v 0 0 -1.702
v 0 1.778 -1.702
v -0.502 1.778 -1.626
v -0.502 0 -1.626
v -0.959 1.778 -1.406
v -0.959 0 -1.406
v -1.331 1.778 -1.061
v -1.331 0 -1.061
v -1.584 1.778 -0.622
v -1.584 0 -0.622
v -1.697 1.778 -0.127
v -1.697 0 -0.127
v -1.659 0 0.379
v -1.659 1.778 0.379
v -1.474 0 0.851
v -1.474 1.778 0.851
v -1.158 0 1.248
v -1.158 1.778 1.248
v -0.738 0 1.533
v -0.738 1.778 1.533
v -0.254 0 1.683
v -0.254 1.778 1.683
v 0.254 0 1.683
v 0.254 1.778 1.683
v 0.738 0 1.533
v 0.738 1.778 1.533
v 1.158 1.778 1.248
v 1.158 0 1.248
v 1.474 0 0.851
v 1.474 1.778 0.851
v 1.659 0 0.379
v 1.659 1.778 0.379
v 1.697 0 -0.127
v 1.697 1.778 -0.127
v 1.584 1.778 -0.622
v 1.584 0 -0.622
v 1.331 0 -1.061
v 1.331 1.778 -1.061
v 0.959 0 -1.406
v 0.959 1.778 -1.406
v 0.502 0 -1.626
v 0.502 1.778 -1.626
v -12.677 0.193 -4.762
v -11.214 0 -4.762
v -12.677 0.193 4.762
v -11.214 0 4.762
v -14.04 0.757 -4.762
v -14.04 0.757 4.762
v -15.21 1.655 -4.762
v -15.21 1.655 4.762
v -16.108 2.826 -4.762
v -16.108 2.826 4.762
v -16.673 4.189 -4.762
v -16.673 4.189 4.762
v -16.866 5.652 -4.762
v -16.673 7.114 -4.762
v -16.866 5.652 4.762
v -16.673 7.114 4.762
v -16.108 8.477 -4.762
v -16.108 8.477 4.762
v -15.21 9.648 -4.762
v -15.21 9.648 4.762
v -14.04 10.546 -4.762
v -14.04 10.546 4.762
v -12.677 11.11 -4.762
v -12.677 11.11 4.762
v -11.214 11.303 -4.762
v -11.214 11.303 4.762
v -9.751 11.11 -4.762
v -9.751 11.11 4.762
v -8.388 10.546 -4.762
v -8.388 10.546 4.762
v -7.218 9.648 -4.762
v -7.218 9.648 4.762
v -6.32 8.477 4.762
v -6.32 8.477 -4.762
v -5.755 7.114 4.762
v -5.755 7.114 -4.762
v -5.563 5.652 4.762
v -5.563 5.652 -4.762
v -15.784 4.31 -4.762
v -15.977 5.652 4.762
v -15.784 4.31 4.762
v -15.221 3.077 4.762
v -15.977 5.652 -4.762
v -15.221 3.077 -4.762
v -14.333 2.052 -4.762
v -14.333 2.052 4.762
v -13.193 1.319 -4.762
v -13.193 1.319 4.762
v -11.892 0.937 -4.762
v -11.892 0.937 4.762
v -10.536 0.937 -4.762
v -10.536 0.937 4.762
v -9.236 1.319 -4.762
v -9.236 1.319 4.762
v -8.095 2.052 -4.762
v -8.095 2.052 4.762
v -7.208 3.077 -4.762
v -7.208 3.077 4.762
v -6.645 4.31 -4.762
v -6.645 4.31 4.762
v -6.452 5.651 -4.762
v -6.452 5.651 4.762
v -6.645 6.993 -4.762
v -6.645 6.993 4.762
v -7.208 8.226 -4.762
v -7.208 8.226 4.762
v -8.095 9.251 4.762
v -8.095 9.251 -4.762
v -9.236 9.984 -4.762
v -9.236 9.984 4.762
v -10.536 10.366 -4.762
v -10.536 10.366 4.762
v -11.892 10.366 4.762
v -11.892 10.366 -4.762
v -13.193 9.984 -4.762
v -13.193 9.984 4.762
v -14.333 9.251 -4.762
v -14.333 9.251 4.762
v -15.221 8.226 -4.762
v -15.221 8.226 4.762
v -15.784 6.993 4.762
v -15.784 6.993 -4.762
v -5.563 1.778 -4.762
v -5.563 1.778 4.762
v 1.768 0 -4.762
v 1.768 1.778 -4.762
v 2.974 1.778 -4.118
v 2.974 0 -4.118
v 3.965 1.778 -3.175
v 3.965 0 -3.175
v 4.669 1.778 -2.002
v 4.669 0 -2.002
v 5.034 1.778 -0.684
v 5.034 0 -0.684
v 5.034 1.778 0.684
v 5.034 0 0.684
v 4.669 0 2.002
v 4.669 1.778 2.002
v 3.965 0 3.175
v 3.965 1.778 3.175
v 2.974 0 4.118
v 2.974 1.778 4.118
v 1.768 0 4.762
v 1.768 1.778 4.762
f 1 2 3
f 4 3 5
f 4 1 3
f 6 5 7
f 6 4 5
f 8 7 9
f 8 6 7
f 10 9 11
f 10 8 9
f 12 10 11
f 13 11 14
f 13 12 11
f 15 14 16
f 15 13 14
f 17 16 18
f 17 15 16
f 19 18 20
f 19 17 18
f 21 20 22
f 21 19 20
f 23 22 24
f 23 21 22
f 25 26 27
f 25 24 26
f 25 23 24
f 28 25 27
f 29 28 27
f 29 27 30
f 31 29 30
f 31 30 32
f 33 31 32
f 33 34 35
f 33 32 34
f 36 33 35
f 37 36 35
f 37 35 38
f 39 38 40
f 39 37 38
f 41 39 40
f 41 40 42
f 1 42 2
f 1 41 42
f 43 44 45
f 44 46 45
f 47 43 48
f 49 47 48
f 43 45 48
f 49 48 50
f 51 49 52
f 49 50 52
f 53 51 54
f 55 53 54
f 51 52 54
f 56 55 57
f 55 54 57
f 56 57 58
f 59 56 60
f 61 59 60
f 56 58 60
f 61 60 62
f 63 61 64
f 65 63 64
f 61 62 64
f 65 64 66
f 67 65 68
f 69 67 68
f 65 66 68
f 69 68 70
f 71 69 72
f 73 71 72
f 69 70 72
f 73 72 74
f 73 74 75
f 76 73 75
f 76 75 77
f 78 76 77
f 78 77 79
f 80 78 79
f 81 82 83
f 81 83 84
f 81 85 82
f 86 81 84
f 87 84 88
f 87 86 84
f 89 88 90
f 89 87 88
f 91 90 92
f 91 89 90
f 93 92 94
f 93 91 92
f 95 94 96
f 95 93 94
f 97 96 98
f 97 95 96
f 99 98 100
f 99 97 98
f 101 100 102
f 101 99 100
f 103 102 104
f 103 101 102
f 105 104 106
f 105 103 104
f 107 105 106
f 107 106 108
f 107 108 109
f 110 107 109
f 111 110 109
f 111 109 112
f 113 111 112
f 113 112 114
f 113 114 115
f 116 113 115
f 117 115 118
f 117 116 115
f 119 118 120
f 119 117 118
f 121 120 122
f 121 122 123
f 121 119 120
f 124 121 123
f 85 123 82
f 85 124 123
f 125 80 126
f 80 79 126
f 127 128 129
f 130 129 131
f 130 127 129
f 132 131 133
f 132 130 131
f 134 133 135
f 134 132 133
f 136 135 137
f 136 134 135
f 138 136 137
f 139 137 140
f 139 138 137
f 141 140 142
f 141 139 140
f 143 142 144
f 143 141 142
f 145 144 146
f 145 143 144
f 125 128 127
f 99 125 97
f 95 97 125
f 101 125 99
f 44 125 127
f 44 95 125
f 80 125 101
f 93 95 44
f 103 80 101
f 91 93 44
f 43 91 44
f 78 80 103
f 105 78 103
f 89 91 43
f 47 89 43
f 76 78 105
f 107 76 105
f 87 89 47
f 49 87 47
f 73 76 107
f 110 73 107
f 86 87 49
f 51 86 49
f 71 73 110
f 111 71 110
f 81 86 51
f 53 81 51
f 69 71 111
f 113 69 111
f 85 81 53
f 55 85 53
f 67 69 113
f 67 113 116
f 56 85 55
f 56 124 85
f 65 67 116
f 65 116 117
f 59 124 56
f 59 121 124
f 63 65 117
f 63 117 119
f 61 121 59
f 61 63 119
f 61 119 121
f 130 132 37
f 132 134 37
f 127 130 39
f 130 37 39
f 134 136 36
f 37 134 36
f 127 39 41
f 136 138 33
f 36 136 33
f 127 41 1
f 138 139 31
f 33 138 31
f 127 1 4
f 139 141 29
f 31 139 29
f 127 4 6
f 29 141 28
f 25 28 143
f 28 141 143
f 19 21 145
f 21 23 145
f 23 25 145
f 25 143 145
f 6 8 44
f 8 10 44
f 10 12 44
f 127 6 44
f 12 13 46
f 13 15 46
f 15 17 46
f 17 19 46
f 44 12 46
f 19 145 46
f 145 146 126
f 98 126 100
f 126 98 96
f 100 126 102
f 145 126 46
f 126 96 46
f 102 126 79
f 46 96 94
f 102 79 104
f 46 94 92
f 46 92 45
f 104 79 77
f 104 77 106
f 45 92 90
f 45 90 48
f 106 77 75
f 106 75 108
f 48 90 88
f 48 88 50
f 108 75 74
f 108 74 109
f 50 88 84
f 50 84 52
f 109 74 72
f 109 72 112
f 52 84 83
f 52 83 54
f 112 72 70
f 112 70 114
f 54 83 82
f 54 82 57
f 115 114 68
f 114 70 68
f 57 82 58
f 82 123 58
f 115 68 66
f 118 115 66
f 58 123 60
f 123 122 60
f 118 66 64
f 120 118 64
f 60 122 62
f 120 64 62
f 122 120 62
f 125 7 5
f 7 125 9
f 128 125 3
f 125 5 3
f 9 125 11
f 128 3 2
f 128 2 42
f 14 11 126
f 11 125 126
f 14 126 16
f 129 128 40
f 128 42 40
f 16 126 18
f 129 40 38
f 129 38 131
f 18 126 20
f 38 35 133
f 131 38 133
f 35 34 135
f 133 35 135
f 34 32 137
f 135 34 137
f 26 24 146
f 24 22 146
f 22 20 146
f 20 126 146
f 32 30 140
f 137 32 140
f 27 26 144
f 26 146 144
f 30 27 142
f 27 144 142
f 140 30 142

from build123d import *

# Parameters (mm, degrees)
SKETCH1_R           = 4.7625
BOSS_EXTRUDE1_DEPTH = 4.7625
SKETCH2_R           = 1.7018
CUT_EXTRUDE1_DEPTH  = 21.853960742


with BuildPart() as part:
    # Sketch1 → Boss-Extrude1 (new, symmetric)
    with BuildSketch(Plane.XY):
        with BuildLine():
            Line((6.35, 0), (-11.2141, 0))
            ThreePointArc((-11.2141, 0), (-15.210313974, 9.647713974), (-5.5626, 5.6515))
            Line((-5.5626, 5.6515), (-5.5626, 1.778))
            Line((-5.5626, 1.778), (6.35, 1.778))
            Line((6.35, 1.778), (6.35, 0))
        make_face()
        with Locations(Location((-11.2141, 5.6515, 0), (0, 0, 180))):
            Circle(SKETCH1_R, mode=Mode.SUBTRACT)
    extrude(amount=BOSS_EXTRUDE1_DEPTH, both=True)

    # Sketch2 → Cut-Extrude1 (cut, through all)
    with BuildSketch(Plane(origin=(0, 0, 0), x_dir=(1, 0, 0), z_dir=(0, 1, 0))):
        with Locations(Location((0, 0, 0), (0, 0, 90))):
            Circle(SKETCH2_R)
        with BuildLine():
            Line((0, -5.08), (0, -11.820740926))
            Line((0, -11.820740926), (11.381105031, -11.820740926))
            Line((11.381105031, -11.820740926), (11.381105031, 11.820740926))
            Line((11.381105031, 11.820740926), (0, 11.820740926))
            Line((0, 11.820740926), (0, 5.08))
            ThreePointArc((0, 5.08), (5.08, 0), (0, -5.08))
        make_face()
    extrude(amount=CUT_EXTRUDE1_DEPTH, mode=Mode.SUBTRACT)


solid = part.part
